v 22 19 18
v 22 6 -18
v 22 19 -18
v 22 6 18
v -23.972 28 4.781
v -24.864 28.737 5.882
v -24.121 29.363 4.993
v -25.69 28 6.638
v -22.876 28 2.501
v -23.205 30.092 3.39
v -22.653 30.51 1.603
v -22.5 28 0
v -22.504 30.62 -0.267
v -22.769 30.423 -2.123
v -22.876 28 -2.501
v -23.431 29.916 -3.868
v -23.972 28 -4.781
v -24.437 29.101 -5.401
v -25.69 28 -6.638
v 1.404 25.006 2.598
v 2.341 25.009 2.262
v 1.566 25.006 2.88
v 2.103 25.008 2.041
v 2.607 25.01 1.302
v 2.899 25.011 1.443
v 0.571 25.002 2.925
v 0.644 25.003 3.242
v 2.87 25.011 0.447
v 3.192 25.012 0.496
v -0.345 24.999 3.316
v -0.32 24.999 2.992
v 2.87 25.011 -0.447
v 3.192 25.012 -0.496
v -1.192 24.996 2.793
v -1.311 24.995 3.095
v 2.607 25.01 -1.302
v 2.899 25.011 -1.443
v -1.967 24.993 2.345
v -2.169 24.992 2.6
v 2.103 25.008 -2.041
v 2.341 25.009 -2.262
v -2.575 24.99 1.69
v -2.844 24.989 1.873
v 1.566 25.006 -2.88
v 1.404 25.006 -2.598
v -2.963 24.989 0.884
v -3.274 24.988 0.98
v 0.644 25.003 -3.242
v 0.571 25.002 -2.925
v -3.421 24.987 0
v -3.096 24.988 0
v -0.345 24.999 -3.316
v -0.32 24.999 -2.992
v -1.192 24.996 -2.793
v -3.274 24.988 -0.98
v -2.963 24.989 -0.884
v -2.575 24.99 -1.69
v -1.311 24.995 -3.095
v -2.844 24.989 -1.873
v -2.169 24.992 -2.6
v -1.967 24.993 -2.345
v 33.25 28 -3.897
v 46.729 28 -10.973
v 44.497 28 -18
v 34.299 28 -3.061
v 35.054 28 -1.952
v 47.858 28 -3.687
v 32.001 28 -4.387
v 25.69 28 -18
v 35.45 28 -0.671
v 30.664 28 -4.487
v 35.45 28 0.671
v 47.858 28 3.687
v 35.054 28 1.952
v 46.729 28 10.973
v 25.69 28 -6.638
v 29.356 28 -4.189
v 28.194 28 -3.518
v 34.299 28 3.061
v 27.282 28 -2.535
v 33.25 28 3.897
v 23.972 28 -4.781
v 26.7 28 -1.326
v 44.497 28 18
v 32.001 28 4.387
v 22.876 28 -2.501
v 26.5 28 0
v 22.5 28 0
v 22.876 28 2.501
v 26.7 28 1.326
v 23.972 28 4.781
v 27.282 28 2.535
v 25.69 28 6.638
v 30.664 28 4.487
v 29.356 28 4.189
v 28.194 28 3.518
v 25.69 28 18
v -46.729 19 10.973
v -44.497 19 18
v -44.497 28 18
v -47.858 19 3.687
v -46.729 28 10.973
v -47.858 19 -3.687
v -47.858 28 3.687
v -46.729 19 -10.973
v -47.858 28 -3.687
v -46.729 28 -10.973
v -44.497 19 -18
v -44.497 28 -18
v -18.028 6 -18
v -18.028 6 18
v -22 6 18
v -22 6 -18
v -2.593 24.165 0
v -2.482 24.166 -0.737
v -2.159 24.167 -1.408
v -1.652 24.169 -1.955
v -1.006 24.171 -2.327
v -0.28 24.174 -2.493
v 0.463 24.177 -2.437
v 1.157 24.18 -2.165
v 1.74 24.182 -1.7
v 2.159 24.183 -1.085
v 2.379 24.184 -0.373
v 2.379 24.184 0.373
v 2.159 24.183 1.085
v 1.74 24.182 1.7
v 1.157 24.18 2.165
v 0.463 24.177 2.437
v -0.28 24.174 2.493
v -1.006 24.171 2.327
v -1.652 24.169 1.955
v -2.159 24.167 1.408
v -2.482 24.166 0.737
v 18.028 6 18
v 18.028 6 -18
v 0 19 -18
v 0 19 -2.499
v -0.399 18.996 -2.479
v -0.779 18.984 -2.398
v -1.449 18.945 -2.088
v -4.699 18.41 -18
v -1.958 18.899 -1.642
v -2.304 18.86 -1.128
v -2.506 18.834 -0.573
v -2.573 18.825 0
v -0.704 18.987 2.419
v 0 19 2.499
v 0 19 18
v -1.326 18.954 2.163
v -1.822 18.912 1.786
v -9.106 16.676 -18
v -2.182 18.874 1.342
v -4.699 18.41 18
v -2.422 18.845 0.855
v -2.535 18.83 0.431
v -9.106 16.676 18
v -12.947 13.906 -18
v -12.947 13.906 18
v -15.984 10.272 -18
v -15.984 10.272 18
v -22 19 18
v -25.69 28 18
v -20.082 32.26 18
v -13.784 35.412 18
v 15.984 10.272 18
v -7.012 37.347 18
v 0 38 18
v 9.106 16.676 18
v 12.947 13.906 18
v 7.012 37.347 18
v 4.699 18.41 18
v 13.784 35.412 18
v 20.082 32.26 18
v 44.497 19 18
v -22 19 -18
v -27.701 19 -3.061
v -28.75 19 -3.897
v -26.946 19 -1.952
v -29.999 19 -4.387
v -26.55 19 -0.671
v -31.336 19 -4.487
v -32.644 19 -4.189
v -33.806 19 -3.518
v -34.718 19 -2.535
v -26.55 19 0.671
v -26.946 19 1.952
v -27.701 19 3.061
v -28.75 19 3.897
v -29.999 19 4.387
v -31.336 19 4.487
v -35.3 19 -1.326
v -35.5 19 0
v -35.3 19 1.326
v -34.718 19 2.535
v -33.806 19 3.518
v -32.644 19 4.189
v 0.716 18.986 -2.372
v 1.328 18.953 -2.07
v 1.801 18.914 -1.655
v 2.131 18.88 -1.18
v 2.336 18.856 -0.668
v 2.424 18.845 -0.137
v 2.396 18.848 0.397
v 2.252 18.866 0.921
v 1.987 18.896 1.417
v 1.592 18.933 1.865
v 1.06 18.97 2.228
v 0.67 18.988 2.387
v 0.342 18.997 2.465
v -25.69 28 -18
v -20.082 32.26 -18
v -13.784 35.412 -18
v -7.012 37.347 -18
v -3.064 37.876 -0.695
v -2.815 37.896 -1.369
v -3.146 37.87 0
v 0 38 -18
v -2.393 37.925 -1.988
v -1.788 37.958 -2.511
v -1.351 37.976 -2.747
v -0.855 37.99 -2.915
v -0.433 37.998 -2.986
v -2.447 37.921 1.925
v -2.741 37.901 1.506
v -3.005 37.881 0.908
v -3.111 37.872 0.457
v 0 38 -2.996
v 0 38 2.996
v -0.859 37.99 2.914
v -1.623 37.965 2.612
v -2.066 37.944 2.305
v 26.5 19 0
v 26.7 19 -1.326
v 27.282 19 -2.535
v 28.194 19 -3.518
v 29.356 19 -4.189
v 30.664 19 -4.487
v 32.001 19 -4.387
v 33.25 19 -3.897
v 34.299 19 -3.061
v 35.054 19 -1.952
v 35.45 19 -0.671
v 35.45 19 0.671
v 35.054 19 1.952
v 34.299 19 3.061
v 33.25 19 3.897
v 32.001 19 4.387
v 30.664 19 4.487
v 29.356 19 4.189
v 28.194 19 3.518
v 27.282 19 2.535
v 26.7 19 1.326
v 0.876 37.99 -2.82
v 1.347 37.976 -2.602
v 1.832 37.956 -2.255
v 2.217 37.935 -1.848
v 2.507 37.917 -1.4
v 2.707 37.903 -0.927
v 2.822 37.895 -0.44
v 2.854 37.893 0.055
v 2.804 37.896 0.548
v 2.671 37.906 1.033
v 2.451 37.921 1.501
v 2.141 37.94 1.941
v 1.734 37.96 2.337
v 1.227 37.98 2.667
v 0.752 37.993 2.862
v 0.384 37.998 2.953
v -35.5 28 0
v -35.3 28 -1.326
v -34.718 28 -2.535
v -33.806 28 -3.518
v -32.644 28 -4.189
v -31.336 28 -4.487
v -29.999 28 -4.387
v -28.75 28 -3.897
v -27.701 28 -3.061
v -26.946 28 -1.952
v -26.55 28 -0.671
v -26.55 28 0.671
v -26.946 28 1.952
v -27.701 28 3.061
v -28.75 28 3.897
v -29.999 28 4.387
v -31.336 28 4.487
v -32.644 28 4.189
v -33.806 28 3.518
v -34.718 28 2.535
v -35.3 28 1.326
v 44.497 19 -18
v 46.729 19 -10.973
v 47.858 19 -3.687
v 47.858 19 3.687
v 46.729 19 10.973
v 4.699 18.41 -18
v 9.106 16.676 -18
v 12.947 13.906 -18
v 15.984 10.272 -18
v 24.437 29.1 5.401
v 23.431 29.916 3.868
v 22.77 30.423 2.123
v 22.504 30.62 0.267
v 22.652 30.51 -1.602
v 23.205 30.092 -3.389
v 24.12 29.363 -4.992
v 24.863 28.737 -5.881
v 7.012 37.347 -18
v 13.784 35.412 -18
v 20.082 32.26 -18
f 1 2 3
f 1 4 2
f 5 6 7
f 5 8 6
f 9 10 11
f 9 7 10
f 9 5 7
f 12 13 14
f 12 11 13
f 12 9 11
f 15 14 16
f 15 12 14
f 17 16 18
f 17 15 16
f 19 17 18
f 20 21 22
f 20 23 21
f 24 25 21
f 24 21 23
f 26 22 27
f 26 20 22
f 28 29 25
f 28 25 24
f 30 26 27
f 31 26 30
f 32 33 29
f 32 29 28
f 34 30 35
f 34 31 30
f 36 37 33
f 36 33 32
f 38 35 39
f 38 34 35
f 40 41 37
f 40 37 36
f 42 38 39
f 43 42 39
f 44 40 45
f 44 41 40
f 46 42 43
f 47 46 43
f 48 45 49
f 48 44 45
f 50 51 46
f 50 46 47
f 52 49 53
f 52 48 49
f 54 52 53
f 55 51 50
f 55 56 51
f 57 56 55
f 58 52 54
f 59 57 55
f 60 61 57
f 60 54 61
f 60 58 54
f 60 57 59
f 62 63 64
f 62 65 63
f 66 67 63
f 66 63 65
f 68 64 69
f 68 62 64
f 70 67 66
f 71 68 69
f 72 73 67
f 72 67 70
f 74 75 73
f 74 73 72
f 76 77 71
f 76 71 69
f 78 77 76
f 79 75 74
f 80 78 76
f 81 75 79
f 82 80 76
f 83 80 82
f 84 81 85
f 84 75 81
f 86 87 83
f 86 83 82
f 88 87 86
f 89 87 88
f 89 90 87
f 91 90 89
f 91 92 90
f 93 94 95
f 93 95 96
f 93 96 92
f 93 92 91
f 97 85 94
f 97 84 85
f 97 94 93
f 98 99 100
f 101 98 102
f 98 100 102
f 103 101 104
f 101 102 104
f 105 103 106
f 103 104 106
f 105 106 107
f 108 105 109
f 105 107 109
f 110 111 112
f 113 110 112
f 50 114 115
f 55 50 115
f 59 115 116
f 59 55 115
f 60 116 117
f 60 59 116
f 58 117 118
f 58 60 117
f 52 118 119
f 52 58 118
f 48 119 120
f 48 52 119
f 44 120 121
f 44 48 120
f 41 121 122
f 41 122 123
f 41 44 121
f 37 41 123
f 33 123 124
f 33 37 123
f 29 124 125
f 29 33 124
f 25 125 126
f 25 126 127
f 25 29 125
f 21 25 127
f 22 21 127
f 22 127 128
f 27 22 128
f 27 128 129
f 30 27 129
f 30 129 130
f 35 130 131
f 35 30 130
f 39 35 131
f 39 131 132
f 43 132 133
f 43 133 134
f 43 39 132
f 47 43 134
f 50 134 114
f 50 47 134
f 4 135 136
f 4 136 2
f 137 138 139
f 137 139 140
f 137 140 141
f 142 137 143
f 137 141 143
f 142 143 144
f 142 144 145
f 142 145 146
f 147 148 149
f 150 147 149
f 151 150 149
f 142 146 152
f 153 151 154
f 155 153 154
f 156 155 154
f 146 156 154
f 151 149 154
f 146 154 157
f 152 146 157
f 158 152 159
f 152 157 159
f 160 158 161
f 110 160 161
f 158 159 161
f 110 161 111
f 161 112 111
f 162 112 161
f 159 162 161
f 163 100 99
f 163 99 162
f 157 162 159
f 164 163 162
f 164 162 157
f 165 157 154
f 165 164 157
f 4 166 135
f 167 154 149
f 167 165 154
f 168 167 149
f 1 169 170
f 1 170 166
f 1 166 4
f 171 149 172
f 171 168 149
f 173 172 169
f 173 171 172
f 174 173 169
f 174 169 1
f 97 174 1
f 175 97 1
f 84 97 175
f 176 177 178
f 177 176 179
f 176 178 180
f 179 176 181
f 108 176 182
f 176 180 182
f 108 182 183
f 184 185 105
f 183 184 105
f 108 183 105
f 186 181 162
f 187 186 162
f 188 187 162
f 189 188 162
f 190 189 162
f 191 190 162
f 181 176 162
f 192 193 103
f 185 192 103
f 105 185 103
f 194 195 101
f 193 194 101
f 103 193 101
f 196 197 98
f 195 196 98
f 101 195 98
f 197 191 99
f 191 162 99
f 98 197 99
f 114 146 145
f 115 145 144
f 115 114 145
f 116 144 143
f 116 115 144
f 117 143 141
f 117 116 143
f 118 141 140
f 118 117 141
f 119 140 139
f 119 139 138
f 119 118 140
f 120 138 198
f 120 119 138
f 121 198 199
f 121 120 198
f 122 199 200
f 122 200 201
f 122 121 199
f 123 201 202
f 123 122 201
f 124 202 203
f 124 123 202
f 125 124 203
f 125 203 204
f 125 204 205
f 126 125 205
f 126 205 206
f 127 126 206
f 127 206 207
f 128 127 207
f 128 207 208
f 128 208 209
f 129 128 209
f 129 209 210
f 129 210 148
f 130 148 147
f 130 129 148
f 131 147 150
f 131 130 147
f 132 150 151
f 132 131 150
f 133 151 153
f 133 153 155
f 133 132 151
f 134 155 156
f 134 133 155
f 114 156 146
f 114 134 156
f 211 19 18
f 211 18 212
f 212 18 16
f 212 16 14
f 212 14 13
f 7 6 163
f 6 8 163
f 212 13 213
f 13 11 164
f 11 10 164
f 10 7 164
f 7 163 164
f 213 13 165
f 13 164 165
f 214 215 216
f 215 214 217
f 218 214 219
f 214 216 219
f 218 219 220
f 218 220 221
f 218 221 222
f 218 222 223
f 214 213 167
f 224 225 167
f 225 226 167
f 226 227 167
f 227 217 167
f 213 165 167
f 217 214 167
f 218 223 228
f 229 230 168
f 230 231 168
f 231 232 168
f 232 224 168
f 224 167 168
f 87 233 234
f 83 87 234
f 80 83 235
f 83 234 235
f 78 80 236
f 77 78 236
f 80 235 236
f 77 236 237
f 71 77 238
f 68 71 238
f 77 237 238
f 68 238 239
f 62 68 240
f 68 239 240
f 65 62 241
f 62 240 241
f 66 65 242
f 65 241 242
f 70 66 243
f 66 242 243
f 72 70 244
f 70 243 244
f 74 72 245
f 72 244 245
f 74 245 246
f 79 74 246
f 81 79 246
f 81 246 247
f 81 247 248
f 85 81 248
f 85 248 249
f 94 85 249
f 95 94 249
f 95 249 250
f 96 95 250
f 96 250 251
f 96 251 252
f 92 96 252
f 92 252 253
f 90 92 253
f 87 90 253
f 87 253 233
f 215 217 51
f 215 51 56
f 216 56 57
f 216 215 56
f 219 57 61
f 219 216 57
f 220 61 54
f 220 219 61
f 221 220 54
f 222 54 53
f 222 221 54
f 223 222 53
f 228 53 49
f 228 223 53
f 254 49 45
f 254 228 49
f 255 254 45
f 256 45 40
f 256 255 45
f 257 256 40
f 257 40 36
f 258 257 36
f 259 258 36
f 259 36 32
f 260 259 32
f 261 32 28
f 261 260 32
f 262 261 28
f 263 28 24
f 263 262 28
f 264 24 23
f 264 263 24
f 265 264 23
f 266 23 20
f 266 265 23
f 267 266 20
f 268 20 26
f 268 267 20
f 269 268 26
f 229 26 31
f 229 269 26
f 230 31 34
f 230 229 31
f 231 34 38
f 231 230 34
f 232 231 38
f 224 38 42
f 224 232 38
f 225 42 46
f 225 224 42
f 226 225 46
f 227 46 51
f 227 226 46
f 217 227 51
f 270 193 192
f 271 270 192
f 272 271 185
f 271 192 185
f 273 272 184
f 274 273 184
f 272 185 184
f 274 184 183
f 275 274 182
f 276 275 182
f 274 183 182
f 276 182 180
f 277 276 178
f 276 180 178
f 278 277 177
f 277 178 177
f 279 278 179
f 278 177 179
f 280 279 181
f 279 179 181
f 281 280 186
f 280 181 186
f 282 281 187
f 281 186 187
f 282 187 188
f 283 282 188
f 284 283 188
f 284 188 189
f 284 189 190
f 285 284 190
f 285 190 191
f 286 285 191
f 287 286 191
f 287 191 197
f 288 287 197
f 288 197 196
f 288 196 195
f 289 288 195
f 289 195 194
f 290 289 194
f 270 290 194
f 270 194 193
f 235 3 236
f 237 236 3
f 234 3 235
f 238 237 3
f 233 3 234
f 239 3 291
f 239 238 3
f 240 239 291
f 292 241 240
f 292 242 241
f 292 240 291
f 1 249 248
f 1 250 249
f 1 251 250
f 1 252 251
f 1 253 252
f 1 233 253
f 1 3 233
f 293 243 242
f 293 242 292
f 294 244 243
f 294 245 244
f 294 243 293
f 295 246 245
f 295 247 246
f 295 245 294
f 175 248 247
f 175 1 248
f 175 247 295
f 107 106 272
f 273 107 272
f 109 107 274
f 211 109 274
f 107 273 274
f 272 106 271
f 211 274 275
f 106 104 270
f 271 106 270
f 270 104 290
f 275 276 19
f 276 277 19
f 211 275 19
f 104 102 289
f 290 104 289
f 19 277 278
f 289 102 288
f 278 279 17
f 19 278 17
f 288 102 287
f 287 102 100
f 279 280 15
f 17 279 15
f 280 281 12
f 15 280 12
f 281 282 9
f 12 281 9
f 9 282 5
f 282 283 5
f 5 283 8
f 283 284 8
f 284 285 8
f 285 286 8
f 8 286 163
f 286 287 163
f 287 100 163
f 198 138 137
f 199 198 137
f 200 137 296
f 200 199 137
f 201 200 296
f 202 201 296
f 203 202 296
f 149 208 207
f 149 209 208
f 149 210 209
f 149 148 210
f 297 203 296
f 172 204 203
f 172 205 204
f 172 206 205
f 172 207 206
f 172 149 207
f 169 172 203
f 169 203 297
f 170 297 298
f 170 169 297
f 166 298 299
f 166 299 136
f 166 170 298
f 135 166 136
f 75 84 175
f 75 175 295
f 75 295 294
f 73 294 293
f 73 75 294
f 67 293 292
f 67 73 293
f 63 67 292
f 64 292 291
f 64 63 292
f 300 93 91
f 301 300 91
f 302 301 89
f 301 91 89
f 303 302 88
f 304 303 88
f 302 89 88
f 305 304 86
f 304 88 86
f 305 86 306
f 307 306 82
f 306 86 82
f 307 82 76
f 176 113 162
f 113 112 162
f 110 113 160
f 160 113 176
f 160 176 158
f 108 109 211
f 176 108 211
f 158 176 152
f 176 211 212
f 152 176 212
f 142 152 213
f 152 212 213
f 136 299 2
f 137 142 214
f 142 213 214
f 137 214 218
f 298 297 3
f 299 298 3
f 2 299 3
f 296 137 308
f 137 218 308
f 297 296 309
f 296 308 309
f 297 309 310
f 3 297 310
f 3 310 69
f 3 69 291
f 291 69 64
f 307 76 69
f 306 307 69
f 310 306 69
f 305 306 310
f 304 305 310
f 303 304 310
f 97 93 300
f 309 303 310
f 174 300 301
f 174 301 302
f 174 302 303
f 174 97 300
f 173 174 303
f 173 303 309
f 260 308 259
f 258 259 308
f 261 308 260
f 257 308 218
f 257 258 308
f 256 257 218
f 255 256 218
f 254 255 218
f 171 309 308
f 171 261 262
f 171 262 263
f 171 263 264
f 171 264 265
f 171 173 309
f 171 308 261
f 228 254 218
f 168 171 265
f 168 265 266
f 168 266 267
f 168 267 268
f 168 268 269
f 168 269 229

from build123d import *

# Parameters (mm, degrees)
BOSS_EXTRUDE1_DEPTH   = 18
F_6_0MM_DOWEL_HOLE2_D = 9
SKETCH24_R            = 8.5
CUT_EXTRUDE7_DEPTH    = 19
CUT_EXTRUDE8_DEPTH    = 23
F_6_0MM_DOWEL_HOLE3_D = 9


with BuildPart() as part:
    # Sketch1 → Boss-Extrude1 (new body, symmetric)
    with BuildSketch(Plane.XY):
        with BuildLine():
            Line((-18.027756377, 6), (-22, 6))
            Line((-22, 6), (-22, 19))
            Line((-22, 19), (-50, 19))
            Line((-50, 19), (-50, 28))
            Line((-50, 28), (-25.690465157, 28))
            ThreePointArc((-25.690465157, 28), (-13.784048752, 35.411862419), (0, 38))
            Line((0, 38), (0, 19))
            ThreePointArc((0, 19), (-11.113055385, 15.411035007), (-18.027756377, 6))
        make_face()
    boss_extrude1 = extrude(amount=BOSS_EXTRUDE1_DEPTH, both=True)

    # Mirror1: Boss-Extrude1 across plane
    add(boss_extrude1.mirror(Plane(origin=(0, 0, 0), x_dir=(0, 0, 1), z_dir=(1, 0, 0))))

    # Ø6.0mm Dowel Hole2 (through all)
    with Locations(Plane(origin=(0, 28, 0), x_dir=(1, 0, 0), z_dir=(0, 1, 0))):
        with Locations((-31, 0)):
            Hole(F_6_0MM_DOWEL_HOLE2_D / 2)

    # Sketch24 → Cut-Extrude7 (cut)
    with BuildSketch(Plane(origin=(0, 28, 0), x_dir=(1, 0, 0), z_dir=(0, 1, 0))):
        with Locations((-31, 0)):
            Circle(SKETCH24_R)
    cut_extrude7 = extrude(amount=CUT_EXTRUDE7_DEPTH, mode=Mode.SUBTRACT)

    # Mirror5: Cut-Extrude7 across plane
    add(cut_extrude7.mirror(Plane(origin=(0, 0, 0), x_dir=(0, 0, 1), z_dir=(1, 0, 0))), mode=Mode.SUBTRACT)

    # Sketch25 → Cut-Extrude8 (cut, through all)
    with BuildSketch(Plane(origin=(0, 28, 0), x_dir=(1, 0, 0), z_dir=(0, 1, 0))):
        with BuildLine():
            Line((-44.497190923, 18), (-50, 18))
            Line((-50, 18), (-50, -18))
            Line((-50, -18), (-44.497190923, -18))
            ThreePointArc((-44.497190923, -18), (-48, 0), (-44.497190923, 18))
        make_face()
    cut_extrude8 = extrude(amount=-CUT_EXTRUDE8_DEPTH, mode=Mode.SUBTRACT)

    # Mirror7: Cut-Extrude8 across plane
    add(cut_extrude8.mirror(Plane(origin=(0, 0, 0), x_dir=(0, 0, 1), z_dir=(1, 0, 0))), mode=Mode.SUBTRACT)

    # Sketch28 → CBORE for M6 Hex Head Machine Screw1 (revolve, cut)
    with BuildSketch(Plane(origin=(-0.146360812, 37.999718137, 0), x_dir=(-0.999992583, -0.0038516, 0), z_dir=(0, 0, 1))):
        Polygon((0, 0), (0, 32.18492132), (2.5, 32.18492132), (2.5, 13.825), (3.325, 13), (3, 13), (3, 0), align=None)
    revolve(axis=Axis((-0.170818474, 44.349671037, 0), (0.0038516, -0.999992583, 0)), mode=Mode.SUBTRACT)

    # Ø6.0mm Dowel Hole3 (through all)
    with Locations(Plane(origin=(0, 28, 0), x_dir=(1, 0, 0), z_dir=(0, 1, 0))):
        with Locations((31, 0)):
            Hole(F_6_0MM_DOWEL_HOLE3_D / 2)


solid = part.part
